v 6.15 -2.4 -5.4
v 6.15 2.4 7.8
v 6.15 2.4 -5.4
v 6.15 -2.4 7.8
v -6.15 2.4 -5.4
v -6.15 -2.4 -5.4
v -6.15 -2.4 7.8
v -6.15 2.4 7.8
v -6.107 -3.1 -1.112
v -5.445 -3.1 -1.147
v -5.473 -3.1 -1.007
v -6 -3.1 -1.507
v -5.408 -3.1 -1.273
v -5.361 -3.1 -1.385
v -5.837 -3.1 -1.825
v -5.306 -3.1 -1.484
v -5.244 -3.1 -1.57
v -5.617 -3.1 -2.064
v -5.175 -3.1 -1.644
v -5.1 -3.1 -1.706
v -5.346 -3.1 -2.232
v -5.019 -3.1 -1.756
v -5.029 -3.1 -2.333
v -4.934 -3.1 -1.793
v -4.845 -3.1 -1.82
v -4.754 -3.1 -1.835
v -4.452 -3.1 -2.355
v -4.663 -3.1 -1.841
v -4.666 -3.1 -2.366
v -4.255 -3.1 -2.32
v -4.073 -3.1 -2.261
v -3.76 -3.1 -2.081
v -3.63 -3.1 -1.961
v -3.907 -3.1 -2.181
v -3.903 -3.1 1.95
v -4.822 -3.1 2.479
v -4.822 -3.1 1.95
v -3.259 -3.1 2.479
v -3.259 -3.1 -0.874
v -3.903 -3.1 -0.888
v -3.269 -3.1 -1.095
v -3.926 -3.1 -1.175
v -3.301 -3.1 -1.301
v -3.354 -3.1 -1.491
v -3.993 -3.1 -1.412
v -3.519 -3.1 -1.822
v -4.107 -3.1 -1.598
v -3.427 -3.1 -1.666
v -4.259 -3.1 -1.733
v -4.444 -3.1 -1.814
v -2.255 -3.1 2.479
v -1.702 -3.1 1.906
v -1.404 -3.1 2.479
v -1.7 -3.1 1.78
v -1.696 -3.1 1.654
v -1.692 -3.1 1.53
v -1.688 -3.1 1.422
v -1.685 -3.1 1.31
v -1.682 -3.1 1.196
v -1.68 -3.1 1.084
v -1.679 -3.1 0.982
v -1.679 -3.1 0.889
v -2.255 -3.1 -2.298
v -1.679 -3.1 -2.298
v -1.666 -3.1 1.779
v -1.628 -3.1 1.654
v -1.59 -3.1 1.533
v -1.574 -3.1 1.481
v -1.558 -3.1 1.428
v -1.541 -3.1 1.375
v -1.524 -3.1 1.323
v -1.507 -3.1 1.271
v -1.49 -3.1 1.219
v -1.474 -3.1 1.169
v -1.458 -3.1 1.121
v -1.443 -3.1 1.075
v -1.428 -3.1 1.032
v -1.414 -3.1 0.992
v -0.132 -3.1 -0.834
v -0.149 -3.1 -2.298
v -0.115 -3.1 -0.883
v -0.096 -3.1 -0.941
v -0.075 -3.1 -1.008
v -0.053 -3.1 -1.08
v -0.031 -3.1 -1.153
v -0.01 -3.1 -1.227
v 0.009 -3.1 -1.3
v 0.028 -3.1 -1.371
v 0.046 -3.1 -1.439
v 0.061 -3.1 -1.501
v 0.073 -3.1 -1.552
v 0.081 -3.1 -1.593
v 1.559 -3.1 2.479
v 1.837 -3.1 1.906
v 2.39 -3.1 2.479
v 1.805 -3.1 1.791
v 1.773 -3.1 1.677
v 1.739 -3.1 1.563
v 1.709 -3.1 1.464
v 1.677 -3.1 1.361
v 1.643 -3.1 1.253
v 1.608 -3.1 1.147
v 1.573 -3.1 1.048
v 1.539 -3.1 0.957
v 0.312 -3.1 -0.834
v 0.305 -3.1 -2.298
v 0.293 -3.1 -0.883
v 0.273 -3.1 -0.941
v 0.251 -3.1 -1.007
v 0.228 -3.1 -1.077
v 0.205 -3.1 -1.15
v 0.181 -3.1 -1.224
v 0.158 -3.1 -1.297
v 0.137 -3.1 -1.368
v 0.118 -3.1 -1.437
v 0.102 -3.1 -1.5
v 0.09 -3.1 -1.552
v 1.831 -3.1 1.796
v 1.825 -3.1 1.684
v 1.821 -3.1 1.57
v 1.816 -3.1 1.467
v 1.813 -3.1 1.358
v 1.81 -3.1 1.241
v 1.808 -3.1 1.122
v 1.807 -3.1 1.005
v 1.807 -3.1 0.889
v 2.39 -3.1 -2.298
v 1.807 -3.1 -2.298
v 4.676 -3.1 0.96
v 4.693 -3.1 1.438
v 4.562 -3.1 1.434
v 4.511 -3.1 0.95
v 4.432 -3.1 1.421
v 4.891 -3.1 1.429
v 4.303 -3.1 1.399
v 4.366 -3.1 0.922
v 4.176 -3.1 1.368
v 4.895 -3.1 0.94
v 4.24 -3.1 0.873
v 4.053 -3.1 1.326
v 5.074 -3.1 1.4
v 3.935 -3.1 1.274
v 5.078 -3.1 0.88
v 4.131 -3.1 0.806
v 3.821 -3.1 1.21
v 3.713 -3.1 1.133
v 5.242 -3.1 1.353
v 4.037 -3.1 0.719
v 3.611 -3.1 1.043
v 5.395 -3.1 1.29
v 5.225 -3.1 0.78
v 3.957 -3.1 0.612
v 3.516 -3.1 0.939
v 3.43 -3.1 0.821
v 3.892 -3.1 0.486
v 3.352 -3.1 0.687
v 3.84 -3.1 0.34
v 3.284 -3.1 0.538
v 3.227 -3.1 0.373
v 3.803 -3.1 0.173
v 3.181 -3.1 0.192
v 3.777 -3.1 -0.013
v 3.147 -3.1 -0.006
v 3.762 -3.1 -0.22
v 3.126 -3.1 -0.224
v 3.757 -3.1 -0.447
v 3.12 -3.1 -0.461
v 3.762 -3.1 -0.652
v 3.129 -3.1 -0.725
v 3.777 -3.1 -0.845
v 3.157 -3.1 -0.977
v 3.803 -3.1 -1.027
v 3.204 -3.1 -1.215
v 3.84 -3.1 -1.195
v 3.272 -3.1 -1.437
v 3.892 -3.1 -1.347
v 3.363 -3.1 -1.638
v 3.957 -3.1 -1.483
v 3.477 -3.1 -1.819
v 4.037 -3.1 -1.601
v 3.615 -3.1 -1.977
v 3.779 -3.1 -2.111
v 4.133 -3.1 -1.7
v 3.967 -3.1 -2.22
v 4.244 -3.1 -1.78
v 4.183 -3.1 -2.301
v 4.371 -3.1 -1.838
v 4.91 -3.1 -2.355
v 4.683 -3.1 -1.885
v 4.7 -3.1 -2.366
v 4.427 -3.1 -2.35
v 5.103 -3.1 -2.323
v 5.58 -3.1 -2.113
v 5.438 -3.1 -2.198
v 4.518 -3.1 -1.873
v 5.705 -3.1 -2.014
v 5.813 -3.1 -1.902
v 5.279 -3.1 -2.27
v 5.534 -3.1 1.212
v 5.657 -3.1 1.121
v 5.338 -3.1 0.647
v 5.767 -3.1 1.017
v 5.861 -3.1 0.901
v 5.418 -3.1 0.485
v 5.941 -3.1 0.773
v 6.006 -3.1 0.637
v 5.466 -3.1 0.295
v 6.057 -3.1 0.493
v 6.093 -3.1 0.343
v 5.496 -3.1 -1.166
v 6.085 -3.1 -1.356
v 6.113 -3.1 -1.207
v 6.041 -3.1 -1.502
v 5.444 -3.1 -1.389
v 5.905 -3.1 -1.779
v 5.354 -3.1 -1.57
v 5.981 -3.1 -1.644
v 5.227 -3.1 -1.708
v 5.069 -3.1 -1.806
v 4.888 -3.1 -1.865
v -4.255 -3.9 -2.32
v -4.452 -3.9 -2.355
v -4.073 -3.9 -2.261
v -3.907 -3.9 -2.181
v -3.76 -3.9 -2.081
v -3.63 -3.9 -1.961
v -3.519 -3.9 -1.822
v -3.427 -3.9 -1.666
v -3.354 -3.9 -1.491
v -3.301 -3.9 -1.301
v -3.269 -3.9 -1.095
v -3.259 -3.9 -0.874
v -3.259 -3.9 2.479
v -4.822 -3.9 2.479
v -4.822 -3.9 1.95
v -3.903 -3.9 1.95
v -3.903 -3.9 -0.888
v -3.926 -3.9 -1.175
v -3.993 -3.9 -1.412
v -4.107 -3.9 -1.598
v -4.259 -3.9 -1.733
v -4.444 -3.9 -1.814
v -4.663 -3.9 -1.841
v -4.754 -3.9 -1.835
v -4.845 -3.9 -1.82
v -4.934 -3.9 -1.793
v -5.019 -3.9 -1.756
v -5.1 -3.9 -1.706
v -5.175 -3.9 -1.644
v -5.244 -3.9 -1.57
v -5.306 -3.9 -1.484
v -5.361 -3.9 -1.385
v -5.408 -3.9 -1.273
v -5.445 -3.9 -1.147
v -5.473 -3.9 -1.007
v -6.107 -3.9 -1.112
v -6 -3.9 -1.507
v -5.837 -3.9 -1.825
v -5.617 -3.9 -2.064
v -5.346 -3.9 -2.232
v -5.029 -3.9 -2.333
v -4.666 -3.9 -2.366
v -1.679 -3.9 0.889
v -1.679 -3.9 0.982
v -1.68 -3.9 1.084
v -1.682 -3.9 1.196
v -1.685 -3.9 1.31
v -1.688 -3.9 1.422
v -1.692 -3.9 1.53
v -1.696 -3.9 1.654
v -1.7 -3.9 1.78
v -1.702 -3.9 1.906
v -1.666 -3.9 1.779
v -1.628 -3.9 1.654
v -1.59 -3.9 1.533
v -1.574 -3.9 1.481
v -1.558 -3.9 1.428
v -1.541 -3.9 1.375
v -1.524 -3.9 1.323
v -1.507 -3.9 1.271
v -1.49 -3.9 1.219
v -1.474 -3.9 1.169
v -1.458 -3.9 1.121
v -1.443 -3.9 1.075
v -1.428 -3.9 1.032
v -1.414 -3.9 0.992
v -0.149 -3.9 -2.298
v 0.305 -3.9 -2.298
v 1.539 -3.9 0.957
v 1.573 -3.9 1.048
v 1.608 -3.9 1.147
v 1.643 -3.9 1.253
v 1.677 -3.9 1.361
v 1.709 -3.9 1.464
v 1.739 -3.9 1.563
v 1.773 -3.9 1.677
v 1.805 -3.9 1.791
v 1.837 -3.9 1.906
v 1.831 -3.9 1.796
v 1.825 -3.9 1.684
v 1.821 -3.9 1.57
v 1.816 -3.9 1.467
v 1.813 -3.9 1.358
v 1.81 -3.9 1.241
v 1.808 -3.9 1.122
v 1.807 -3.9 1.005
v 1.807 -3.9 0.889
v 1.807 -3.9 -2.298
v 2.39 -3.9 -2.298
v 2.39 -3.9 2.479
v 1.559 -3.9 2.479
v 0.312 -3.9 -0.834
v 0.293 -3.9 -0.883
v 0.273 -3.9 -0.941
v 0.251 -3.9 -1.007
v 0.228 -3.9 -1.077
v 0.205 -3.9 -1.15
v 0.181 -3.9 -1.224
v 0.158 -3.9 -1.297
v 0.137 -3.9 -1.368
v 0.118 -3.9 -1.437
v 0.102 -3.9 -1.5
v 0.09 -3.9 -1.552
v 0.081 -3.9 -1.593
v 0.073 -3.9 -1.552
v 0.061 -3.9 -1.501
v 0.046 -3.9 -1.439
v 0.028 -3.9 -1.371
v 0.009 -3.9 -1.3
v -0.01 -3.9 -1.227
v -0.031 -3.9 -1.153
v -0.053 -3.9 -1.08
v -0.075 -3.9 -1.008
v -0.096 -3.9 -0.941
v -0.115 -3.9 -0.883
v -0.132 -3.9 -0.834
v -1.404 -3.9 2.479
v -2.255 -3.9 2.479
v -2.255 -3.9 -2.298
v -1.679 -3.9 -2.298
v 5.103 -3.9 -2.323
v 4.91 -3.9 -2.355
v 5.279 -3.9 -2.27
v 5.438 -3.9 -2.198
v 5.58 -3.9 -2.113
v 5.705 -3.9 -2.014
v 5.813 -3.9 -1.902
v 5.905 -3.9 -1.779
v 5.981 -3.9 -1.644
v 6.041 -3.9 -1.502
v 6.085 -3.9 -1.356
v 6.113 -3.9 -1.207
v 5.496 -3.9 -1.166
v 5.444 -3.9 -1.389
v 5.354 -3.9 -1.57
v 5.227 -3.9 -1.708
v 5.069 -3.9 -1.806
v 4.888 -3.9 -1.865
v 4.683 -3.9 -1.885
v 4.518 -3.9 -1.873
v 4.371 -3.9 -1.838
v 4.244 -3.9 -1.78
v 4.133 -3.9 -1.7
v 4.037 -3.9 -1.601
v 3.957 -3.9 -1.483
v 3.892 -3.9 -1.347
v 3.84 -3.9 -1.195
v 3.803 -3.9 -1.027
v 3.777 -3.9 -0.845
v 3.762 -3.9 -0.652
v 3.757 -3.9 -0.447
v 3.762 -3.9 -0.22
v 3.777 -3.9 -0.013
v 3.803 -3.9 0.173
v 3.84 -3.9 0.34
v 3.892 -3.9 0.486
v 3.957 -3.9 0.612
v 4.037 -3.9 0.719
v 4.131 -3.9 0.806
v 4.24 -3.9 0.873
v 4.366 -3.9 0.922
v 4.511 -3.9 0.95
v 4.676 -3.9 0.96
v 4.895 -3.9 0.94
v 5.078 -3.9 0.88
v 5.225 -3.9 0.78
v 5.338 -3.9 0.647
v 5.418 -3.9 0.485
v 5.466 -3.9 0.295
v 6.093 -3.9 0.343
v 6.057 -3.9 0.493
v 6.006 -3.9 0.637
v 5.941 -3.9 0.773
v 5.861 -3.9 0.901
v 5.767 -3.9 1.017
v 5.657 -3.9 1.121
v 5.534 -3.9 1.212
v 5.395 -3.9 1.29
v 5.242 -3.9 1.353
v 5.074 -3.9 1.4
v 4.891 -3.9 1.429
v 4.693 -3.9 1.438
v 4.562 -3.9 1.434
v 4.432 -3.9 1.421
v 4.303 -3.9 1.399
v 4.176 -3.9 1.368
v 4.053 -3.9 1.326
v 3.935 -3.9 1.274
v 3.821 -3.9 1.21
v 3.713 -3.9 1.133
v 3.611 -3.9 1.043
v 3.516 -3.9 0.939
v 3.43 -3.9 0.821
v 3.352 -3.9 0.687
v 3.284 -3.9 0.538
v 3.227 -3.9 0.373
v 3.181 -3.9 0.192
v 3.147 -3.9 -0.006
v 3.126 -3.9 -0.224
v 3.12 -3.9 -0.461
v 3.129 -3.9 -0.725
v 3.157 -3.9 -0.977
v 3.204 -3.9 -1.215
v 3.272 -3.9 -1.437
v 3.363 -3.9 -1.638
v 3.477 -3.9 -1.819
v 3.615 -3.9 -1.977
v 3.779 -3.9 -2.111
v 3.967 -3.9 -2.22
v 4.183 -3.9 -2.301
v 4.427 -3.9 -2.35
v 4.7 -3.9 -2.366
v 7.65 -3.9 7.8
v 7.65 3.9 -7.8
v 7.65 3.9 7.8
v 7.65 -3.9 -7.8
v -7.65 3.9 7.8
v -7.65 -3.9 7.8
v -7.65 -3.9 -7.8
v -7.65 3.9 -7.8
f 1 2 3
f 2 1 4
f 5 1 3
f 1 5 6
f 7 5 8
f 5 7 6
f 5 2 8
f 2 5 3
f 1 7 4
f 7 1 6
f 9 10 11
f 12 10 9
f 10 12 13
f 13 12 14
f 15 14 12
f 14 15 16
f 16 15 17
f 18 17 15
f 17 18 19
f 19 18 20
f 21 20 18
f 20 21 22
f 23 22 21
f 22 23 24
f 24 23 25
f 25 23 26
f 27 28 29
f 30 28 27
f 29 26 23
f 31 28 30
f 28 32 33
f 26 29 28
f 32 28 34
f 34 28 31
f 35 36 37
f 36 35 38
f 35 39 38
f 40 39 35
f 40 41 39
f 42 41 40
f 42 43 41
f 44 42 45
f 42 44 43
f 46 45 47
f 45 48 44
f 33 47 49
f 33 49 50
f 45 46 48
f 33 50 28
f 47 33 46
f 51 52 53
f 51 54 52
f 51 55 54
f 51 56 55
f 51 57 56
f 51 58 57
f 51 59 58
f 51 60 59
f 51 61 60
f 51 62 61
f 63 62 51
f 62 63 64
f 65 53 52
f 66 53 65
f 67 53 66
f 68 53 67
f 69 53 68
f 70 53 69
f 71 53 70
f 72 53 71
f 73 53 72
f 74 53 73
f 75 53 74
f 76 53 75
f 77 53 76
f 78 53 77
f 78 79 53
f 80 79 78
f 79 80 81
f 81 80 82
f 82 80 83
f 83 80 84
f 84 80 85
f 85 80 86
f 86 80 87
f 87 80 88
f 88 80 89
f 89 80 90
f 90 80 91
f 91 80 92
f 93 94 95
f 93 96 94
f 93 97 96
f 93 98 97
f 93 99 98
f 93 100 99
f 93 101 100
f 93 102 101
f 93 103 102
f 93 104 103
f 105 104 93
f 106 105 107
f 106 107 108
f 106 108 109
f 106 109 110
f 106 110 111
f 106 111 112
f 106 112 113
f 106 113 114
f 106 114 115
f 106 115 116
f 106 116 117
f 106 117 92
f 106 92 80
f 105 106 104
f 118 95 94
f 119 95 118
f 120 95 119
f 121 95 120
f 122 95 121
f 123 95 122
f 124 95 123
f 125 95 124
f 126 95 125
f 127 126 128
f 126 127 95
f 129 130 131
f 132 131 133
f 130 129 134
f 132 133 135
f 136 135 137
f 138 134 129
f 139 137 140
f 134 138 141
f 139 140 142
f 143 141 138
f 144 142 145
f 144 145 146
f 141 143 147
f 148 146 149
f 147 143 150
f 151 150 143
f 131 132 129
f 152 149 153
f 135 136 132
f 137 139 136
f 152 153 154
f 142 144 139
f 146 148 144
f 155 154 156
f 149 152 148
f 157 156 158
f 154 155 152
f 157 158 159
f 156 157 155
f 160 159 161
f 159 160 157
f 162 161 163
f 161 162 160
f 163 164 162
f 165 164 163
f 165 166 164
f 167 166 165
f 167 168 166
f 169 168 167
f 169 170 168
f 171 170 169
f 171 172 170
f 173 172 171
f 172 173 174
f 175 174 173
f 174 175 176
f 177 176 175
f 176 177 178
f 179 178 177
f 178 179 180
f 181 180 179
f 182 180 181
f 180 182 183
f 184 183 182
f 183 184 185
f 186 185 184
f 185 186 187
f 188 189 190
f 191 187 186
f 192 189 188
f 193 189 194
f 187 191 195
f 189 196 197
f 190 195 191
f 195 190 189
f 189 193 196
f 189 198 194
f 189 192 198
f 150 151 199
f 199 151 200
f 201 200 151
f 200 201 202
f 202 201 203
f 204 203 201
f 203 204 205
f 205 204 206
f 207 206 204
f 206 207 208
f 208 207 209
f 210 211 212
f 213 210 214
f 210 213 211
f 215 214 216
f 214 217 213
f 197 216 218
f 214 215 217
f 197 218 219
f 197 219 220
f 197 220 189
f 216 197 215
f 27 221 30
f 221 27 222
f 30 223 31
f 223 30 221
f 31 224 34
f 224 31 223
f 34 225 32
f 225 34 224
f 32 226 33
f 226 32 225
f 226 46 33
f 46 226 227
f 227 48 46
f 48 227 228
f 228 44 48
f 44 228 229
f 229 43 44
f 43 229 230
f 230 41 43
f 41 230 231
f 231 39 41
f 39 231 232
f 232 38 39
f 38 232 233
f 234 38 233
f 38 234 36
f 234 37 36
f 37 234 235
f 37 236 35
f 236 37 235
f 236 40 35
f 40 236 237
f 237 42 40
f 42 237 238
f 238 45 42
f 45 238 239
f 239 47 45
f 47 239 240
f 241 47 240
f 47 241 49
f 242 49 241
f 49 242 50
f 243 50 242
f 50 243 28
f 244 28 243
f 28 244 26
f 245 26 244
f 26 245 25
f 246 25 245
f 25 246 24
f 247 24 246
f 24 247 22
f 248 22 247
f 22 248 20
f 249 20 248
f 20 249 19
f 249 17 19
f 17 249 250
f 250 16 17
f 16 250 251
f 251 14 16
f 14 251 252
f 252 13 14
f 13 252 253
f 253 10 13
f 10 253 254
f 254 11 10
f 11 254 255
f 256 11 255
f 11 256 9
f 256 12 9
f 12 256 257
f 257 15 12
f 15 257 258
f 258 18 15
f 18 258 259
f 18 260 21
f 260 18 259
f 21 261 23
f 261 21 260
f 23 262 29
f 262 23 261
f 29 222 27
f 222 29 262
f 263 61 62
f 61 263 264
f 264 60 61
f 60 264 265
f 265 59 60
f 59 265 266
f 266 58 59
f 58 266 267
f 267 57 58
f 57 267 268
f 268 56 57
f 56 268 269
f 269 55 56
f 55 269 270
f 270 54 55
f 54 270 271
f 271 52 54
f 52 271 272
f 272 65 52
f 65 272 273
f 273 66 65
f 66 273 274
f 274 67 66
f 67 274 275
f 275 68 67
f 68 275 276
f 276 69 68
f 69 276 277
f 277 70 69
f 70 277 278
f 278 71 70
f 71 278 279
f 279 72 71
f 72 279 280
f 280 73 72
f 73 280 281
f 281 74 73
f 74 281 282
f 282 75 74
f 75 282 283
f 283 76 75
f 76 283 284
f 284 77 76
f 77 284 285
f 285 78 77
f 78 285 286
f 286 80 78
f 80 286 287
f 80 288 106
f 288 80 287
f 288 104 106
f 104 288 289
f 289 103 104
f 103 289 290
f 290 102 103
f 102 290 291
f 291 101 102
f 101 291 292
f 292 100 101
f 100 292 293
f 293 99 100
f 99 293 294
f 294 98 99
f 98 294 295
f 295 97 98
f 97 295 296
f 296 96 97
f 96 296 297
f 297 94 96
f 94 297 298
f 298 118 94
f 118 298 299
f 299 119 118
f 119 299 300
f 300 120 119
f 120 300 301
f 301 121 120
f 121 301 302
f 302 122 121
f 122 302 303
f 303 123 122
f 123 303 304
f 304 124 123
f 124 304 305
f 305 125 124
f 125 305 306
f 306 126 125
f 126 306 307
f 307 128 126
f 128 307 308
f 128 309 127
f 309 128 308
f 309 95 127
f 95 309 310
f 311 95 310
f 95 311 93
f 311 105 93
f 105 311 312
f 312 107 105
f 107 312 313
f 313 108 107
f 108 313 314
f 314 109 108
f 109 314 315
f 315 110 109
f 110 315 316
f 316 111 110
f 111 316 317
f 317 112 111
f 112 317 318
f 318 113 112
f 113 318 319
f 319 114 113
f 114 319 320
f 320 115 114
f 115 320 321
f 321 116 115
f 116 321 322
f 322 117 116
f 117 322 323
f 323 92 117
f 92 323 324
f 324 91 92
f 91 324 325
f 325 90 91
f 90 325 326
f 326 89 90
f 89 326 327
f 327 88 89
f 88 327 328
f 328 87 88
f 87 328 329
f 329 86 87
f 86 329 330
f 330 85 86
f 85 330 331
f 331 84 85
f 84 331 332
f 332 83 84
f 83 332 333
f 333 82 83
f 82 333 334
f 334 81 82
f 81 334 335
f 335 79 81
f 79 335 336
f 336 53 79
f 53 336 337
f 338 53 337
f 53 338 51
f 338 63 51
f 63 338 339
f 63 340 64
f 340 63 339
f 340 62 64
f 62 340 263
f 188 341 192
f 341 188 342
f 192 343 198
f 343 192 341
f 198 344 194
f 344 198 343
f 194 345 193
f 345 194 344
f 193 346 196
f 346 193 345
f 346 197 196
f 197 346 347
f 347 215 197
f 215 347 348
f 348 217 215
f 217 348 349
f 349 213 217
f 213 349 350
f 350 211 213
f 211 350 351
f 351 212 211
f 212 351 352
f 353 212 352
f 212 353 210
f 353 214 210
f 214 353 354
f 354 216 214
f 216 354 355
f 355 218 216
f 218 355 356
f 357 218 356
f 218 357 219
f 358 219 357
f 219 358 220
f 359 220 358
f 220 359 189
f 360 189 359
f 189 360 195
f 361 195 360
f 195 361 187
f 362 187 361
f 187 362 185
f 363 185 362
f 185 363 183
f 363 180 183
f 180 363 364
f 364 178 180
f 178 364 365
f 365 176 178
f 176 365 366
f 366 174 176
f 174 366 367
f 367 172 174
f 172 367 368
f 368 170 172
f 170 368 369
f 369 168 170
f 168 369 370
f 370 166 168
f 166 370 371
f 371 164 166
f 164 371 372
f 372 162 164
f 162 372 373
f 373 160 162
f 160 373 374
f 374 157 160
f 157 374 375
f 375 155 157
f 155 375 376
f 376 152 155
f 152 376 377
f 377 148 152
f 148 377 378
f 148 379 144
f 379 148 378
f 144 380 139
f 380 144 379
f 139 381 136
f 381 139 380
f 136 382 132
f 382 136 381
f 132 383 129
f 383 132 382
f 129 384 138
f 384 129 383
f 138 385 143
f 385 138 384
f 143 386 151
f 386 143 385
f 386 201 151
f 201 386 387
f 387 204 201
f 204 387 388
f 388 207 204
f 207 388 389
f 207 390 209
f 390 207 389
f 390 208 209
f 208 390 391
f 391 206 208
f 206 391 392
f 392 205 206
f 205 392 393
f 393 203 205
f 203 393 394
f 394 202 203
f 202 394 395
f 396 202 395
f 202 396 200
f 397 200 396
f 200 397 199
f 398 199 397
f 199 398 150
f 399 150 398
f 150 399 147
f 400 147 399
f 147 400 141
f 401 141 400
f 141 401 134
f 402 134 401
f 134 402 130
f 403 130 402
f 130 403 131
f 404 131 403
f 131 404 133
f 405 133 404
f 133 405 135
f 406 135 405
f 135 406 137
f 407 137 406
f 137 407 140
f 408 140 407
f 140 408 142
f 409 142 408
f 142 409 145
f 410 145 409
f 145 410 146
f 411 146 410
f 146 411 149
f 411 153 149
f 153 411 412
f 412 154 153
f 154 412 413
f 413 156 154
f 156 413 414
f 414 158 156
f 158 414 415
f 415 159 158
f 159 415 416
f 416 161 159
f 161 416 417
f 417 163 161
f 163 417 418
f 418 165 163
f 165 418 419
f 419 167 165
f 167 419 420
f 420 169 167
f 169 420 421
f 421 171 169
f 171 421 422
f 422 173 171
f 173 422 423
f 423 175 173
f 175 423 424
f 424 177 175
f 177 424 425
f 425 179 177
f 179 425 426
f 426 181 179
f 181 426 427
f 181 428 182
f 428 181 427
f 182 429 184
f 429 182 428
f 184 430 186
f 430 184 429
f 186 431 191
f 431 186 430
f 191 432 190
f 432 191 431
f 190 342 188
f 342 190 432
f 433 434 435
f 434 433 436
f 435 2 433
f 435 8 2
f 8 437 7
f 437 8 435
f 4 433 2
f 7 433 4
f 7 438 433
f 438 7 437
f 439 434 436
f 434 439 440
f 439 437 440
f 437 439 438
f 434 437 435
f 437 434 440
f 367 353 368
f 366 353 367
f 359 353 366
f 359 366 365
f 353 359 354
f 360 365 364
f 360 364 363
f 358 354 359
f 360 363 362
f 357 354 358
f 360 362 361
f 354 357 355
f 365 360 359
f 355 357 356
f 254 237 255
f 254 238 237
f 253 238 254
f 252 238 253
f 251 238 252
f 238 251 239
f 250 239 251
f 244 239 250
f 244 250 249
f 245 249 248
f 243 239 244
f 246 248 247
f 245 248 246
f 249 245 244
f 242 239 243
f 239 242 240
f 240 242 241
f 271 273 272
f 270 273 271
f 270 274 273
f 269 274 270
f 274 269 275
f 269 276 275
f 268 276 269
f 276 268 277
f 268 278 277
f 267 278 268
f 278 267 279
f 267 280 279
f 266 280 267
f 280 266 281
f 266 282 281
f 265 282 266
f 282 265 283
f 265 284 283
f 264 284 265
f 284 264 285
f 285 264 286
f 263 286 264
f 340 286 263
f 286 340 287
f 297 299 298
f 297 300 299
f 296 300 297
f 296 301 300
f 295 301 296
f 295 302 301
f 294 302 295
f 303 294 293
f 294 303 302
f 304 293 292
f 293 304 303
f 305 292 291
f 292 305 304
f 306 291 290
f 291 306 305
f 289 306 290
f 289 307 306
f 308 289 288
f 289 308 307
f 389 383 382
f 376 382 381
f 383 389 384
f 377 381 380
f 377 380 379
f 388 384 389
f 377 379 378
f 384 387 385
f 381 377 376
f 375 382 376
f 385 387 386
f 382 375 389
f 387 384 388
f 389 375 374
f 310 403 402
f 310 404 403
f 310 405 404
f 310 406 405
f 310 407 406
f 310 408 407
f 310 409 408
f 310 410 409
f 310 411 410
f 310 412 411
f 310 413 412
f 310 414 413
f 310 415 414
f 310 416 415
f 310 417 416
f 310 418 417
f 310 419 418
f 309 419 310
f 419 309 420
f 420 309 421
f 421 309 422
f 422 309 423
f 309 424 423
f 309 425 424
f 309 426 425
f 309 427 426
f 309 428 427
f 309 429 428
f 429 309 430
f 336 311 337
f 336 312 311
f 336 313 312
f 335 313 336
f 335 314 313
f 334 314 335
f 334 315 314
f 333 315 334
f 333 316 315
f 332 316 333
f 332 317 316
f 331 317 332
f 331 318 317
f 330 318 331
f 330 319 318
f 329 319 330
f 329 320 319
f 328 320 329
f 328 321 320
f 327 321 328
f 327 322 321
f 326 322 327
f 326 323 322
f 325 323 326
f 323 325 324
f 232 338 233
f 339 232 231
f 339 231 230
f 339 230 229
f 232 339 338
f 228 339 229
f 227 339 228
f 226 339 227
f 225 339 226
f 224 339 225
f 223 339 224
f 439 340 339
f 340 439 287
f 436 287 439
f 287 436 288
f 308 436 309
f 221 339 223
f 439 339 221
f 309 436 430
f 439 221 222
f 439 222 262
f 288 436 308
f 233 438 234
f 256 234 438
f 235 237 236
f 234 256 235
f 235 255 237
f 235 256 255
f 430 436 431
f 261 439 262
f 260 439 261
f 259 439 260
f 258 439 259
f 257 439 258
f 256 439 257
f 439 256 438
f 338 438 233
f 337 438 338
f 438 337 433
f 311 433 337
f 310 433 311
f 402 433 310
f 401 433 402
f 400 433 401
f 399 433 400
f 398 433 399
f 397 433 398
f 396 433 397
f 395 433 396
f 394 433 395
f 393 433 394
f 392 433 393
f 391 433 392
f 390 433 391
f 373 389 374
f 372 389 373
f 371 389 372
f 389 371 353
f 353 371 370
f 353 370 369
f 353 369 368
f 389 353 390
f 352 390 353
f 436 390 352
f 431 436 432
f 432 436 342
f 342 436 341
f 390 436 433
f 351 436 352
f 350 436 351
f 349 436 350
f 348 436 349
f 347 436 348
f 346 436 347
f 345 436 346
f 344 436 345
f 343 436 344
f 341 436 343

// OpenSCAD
// USB Cap in OpenSCAD - Stewart Russell, 2020-03

initials            = "JMc";

// design parameters, mm
width               = 12   + 0.1;
depth               =  4.5 + 0.1;
height              = 14;
print_tolerance     =  0.2;
wall_thickness      =  1.6;

difference() {
    // outer wall
    cube([  width  + 2 * wall_thickness, 
            depth  + 2 * wall_thickness, 
            height + wall_thickness     ],
          center=true);
    // "holes"
    union() {
        // hole for USB connector
        translate([0, 0, wall_thickness]) {
            cube([ width + print_tolerance, 
                    depth + print_tolerance, 
                    height ],
                center=true);
        }
        // initials
        translate([0, -(depth / 2) - wall_thickness, 0]) {
            rotate([90, 0, 0]) {
                linear_extrude(height=wall_thickness, 
                    center=true) {
                    text(   initials,
                            halign="center", 
                            valign="center",
                            size=5);
                }
            }
        }
    }
}

               
